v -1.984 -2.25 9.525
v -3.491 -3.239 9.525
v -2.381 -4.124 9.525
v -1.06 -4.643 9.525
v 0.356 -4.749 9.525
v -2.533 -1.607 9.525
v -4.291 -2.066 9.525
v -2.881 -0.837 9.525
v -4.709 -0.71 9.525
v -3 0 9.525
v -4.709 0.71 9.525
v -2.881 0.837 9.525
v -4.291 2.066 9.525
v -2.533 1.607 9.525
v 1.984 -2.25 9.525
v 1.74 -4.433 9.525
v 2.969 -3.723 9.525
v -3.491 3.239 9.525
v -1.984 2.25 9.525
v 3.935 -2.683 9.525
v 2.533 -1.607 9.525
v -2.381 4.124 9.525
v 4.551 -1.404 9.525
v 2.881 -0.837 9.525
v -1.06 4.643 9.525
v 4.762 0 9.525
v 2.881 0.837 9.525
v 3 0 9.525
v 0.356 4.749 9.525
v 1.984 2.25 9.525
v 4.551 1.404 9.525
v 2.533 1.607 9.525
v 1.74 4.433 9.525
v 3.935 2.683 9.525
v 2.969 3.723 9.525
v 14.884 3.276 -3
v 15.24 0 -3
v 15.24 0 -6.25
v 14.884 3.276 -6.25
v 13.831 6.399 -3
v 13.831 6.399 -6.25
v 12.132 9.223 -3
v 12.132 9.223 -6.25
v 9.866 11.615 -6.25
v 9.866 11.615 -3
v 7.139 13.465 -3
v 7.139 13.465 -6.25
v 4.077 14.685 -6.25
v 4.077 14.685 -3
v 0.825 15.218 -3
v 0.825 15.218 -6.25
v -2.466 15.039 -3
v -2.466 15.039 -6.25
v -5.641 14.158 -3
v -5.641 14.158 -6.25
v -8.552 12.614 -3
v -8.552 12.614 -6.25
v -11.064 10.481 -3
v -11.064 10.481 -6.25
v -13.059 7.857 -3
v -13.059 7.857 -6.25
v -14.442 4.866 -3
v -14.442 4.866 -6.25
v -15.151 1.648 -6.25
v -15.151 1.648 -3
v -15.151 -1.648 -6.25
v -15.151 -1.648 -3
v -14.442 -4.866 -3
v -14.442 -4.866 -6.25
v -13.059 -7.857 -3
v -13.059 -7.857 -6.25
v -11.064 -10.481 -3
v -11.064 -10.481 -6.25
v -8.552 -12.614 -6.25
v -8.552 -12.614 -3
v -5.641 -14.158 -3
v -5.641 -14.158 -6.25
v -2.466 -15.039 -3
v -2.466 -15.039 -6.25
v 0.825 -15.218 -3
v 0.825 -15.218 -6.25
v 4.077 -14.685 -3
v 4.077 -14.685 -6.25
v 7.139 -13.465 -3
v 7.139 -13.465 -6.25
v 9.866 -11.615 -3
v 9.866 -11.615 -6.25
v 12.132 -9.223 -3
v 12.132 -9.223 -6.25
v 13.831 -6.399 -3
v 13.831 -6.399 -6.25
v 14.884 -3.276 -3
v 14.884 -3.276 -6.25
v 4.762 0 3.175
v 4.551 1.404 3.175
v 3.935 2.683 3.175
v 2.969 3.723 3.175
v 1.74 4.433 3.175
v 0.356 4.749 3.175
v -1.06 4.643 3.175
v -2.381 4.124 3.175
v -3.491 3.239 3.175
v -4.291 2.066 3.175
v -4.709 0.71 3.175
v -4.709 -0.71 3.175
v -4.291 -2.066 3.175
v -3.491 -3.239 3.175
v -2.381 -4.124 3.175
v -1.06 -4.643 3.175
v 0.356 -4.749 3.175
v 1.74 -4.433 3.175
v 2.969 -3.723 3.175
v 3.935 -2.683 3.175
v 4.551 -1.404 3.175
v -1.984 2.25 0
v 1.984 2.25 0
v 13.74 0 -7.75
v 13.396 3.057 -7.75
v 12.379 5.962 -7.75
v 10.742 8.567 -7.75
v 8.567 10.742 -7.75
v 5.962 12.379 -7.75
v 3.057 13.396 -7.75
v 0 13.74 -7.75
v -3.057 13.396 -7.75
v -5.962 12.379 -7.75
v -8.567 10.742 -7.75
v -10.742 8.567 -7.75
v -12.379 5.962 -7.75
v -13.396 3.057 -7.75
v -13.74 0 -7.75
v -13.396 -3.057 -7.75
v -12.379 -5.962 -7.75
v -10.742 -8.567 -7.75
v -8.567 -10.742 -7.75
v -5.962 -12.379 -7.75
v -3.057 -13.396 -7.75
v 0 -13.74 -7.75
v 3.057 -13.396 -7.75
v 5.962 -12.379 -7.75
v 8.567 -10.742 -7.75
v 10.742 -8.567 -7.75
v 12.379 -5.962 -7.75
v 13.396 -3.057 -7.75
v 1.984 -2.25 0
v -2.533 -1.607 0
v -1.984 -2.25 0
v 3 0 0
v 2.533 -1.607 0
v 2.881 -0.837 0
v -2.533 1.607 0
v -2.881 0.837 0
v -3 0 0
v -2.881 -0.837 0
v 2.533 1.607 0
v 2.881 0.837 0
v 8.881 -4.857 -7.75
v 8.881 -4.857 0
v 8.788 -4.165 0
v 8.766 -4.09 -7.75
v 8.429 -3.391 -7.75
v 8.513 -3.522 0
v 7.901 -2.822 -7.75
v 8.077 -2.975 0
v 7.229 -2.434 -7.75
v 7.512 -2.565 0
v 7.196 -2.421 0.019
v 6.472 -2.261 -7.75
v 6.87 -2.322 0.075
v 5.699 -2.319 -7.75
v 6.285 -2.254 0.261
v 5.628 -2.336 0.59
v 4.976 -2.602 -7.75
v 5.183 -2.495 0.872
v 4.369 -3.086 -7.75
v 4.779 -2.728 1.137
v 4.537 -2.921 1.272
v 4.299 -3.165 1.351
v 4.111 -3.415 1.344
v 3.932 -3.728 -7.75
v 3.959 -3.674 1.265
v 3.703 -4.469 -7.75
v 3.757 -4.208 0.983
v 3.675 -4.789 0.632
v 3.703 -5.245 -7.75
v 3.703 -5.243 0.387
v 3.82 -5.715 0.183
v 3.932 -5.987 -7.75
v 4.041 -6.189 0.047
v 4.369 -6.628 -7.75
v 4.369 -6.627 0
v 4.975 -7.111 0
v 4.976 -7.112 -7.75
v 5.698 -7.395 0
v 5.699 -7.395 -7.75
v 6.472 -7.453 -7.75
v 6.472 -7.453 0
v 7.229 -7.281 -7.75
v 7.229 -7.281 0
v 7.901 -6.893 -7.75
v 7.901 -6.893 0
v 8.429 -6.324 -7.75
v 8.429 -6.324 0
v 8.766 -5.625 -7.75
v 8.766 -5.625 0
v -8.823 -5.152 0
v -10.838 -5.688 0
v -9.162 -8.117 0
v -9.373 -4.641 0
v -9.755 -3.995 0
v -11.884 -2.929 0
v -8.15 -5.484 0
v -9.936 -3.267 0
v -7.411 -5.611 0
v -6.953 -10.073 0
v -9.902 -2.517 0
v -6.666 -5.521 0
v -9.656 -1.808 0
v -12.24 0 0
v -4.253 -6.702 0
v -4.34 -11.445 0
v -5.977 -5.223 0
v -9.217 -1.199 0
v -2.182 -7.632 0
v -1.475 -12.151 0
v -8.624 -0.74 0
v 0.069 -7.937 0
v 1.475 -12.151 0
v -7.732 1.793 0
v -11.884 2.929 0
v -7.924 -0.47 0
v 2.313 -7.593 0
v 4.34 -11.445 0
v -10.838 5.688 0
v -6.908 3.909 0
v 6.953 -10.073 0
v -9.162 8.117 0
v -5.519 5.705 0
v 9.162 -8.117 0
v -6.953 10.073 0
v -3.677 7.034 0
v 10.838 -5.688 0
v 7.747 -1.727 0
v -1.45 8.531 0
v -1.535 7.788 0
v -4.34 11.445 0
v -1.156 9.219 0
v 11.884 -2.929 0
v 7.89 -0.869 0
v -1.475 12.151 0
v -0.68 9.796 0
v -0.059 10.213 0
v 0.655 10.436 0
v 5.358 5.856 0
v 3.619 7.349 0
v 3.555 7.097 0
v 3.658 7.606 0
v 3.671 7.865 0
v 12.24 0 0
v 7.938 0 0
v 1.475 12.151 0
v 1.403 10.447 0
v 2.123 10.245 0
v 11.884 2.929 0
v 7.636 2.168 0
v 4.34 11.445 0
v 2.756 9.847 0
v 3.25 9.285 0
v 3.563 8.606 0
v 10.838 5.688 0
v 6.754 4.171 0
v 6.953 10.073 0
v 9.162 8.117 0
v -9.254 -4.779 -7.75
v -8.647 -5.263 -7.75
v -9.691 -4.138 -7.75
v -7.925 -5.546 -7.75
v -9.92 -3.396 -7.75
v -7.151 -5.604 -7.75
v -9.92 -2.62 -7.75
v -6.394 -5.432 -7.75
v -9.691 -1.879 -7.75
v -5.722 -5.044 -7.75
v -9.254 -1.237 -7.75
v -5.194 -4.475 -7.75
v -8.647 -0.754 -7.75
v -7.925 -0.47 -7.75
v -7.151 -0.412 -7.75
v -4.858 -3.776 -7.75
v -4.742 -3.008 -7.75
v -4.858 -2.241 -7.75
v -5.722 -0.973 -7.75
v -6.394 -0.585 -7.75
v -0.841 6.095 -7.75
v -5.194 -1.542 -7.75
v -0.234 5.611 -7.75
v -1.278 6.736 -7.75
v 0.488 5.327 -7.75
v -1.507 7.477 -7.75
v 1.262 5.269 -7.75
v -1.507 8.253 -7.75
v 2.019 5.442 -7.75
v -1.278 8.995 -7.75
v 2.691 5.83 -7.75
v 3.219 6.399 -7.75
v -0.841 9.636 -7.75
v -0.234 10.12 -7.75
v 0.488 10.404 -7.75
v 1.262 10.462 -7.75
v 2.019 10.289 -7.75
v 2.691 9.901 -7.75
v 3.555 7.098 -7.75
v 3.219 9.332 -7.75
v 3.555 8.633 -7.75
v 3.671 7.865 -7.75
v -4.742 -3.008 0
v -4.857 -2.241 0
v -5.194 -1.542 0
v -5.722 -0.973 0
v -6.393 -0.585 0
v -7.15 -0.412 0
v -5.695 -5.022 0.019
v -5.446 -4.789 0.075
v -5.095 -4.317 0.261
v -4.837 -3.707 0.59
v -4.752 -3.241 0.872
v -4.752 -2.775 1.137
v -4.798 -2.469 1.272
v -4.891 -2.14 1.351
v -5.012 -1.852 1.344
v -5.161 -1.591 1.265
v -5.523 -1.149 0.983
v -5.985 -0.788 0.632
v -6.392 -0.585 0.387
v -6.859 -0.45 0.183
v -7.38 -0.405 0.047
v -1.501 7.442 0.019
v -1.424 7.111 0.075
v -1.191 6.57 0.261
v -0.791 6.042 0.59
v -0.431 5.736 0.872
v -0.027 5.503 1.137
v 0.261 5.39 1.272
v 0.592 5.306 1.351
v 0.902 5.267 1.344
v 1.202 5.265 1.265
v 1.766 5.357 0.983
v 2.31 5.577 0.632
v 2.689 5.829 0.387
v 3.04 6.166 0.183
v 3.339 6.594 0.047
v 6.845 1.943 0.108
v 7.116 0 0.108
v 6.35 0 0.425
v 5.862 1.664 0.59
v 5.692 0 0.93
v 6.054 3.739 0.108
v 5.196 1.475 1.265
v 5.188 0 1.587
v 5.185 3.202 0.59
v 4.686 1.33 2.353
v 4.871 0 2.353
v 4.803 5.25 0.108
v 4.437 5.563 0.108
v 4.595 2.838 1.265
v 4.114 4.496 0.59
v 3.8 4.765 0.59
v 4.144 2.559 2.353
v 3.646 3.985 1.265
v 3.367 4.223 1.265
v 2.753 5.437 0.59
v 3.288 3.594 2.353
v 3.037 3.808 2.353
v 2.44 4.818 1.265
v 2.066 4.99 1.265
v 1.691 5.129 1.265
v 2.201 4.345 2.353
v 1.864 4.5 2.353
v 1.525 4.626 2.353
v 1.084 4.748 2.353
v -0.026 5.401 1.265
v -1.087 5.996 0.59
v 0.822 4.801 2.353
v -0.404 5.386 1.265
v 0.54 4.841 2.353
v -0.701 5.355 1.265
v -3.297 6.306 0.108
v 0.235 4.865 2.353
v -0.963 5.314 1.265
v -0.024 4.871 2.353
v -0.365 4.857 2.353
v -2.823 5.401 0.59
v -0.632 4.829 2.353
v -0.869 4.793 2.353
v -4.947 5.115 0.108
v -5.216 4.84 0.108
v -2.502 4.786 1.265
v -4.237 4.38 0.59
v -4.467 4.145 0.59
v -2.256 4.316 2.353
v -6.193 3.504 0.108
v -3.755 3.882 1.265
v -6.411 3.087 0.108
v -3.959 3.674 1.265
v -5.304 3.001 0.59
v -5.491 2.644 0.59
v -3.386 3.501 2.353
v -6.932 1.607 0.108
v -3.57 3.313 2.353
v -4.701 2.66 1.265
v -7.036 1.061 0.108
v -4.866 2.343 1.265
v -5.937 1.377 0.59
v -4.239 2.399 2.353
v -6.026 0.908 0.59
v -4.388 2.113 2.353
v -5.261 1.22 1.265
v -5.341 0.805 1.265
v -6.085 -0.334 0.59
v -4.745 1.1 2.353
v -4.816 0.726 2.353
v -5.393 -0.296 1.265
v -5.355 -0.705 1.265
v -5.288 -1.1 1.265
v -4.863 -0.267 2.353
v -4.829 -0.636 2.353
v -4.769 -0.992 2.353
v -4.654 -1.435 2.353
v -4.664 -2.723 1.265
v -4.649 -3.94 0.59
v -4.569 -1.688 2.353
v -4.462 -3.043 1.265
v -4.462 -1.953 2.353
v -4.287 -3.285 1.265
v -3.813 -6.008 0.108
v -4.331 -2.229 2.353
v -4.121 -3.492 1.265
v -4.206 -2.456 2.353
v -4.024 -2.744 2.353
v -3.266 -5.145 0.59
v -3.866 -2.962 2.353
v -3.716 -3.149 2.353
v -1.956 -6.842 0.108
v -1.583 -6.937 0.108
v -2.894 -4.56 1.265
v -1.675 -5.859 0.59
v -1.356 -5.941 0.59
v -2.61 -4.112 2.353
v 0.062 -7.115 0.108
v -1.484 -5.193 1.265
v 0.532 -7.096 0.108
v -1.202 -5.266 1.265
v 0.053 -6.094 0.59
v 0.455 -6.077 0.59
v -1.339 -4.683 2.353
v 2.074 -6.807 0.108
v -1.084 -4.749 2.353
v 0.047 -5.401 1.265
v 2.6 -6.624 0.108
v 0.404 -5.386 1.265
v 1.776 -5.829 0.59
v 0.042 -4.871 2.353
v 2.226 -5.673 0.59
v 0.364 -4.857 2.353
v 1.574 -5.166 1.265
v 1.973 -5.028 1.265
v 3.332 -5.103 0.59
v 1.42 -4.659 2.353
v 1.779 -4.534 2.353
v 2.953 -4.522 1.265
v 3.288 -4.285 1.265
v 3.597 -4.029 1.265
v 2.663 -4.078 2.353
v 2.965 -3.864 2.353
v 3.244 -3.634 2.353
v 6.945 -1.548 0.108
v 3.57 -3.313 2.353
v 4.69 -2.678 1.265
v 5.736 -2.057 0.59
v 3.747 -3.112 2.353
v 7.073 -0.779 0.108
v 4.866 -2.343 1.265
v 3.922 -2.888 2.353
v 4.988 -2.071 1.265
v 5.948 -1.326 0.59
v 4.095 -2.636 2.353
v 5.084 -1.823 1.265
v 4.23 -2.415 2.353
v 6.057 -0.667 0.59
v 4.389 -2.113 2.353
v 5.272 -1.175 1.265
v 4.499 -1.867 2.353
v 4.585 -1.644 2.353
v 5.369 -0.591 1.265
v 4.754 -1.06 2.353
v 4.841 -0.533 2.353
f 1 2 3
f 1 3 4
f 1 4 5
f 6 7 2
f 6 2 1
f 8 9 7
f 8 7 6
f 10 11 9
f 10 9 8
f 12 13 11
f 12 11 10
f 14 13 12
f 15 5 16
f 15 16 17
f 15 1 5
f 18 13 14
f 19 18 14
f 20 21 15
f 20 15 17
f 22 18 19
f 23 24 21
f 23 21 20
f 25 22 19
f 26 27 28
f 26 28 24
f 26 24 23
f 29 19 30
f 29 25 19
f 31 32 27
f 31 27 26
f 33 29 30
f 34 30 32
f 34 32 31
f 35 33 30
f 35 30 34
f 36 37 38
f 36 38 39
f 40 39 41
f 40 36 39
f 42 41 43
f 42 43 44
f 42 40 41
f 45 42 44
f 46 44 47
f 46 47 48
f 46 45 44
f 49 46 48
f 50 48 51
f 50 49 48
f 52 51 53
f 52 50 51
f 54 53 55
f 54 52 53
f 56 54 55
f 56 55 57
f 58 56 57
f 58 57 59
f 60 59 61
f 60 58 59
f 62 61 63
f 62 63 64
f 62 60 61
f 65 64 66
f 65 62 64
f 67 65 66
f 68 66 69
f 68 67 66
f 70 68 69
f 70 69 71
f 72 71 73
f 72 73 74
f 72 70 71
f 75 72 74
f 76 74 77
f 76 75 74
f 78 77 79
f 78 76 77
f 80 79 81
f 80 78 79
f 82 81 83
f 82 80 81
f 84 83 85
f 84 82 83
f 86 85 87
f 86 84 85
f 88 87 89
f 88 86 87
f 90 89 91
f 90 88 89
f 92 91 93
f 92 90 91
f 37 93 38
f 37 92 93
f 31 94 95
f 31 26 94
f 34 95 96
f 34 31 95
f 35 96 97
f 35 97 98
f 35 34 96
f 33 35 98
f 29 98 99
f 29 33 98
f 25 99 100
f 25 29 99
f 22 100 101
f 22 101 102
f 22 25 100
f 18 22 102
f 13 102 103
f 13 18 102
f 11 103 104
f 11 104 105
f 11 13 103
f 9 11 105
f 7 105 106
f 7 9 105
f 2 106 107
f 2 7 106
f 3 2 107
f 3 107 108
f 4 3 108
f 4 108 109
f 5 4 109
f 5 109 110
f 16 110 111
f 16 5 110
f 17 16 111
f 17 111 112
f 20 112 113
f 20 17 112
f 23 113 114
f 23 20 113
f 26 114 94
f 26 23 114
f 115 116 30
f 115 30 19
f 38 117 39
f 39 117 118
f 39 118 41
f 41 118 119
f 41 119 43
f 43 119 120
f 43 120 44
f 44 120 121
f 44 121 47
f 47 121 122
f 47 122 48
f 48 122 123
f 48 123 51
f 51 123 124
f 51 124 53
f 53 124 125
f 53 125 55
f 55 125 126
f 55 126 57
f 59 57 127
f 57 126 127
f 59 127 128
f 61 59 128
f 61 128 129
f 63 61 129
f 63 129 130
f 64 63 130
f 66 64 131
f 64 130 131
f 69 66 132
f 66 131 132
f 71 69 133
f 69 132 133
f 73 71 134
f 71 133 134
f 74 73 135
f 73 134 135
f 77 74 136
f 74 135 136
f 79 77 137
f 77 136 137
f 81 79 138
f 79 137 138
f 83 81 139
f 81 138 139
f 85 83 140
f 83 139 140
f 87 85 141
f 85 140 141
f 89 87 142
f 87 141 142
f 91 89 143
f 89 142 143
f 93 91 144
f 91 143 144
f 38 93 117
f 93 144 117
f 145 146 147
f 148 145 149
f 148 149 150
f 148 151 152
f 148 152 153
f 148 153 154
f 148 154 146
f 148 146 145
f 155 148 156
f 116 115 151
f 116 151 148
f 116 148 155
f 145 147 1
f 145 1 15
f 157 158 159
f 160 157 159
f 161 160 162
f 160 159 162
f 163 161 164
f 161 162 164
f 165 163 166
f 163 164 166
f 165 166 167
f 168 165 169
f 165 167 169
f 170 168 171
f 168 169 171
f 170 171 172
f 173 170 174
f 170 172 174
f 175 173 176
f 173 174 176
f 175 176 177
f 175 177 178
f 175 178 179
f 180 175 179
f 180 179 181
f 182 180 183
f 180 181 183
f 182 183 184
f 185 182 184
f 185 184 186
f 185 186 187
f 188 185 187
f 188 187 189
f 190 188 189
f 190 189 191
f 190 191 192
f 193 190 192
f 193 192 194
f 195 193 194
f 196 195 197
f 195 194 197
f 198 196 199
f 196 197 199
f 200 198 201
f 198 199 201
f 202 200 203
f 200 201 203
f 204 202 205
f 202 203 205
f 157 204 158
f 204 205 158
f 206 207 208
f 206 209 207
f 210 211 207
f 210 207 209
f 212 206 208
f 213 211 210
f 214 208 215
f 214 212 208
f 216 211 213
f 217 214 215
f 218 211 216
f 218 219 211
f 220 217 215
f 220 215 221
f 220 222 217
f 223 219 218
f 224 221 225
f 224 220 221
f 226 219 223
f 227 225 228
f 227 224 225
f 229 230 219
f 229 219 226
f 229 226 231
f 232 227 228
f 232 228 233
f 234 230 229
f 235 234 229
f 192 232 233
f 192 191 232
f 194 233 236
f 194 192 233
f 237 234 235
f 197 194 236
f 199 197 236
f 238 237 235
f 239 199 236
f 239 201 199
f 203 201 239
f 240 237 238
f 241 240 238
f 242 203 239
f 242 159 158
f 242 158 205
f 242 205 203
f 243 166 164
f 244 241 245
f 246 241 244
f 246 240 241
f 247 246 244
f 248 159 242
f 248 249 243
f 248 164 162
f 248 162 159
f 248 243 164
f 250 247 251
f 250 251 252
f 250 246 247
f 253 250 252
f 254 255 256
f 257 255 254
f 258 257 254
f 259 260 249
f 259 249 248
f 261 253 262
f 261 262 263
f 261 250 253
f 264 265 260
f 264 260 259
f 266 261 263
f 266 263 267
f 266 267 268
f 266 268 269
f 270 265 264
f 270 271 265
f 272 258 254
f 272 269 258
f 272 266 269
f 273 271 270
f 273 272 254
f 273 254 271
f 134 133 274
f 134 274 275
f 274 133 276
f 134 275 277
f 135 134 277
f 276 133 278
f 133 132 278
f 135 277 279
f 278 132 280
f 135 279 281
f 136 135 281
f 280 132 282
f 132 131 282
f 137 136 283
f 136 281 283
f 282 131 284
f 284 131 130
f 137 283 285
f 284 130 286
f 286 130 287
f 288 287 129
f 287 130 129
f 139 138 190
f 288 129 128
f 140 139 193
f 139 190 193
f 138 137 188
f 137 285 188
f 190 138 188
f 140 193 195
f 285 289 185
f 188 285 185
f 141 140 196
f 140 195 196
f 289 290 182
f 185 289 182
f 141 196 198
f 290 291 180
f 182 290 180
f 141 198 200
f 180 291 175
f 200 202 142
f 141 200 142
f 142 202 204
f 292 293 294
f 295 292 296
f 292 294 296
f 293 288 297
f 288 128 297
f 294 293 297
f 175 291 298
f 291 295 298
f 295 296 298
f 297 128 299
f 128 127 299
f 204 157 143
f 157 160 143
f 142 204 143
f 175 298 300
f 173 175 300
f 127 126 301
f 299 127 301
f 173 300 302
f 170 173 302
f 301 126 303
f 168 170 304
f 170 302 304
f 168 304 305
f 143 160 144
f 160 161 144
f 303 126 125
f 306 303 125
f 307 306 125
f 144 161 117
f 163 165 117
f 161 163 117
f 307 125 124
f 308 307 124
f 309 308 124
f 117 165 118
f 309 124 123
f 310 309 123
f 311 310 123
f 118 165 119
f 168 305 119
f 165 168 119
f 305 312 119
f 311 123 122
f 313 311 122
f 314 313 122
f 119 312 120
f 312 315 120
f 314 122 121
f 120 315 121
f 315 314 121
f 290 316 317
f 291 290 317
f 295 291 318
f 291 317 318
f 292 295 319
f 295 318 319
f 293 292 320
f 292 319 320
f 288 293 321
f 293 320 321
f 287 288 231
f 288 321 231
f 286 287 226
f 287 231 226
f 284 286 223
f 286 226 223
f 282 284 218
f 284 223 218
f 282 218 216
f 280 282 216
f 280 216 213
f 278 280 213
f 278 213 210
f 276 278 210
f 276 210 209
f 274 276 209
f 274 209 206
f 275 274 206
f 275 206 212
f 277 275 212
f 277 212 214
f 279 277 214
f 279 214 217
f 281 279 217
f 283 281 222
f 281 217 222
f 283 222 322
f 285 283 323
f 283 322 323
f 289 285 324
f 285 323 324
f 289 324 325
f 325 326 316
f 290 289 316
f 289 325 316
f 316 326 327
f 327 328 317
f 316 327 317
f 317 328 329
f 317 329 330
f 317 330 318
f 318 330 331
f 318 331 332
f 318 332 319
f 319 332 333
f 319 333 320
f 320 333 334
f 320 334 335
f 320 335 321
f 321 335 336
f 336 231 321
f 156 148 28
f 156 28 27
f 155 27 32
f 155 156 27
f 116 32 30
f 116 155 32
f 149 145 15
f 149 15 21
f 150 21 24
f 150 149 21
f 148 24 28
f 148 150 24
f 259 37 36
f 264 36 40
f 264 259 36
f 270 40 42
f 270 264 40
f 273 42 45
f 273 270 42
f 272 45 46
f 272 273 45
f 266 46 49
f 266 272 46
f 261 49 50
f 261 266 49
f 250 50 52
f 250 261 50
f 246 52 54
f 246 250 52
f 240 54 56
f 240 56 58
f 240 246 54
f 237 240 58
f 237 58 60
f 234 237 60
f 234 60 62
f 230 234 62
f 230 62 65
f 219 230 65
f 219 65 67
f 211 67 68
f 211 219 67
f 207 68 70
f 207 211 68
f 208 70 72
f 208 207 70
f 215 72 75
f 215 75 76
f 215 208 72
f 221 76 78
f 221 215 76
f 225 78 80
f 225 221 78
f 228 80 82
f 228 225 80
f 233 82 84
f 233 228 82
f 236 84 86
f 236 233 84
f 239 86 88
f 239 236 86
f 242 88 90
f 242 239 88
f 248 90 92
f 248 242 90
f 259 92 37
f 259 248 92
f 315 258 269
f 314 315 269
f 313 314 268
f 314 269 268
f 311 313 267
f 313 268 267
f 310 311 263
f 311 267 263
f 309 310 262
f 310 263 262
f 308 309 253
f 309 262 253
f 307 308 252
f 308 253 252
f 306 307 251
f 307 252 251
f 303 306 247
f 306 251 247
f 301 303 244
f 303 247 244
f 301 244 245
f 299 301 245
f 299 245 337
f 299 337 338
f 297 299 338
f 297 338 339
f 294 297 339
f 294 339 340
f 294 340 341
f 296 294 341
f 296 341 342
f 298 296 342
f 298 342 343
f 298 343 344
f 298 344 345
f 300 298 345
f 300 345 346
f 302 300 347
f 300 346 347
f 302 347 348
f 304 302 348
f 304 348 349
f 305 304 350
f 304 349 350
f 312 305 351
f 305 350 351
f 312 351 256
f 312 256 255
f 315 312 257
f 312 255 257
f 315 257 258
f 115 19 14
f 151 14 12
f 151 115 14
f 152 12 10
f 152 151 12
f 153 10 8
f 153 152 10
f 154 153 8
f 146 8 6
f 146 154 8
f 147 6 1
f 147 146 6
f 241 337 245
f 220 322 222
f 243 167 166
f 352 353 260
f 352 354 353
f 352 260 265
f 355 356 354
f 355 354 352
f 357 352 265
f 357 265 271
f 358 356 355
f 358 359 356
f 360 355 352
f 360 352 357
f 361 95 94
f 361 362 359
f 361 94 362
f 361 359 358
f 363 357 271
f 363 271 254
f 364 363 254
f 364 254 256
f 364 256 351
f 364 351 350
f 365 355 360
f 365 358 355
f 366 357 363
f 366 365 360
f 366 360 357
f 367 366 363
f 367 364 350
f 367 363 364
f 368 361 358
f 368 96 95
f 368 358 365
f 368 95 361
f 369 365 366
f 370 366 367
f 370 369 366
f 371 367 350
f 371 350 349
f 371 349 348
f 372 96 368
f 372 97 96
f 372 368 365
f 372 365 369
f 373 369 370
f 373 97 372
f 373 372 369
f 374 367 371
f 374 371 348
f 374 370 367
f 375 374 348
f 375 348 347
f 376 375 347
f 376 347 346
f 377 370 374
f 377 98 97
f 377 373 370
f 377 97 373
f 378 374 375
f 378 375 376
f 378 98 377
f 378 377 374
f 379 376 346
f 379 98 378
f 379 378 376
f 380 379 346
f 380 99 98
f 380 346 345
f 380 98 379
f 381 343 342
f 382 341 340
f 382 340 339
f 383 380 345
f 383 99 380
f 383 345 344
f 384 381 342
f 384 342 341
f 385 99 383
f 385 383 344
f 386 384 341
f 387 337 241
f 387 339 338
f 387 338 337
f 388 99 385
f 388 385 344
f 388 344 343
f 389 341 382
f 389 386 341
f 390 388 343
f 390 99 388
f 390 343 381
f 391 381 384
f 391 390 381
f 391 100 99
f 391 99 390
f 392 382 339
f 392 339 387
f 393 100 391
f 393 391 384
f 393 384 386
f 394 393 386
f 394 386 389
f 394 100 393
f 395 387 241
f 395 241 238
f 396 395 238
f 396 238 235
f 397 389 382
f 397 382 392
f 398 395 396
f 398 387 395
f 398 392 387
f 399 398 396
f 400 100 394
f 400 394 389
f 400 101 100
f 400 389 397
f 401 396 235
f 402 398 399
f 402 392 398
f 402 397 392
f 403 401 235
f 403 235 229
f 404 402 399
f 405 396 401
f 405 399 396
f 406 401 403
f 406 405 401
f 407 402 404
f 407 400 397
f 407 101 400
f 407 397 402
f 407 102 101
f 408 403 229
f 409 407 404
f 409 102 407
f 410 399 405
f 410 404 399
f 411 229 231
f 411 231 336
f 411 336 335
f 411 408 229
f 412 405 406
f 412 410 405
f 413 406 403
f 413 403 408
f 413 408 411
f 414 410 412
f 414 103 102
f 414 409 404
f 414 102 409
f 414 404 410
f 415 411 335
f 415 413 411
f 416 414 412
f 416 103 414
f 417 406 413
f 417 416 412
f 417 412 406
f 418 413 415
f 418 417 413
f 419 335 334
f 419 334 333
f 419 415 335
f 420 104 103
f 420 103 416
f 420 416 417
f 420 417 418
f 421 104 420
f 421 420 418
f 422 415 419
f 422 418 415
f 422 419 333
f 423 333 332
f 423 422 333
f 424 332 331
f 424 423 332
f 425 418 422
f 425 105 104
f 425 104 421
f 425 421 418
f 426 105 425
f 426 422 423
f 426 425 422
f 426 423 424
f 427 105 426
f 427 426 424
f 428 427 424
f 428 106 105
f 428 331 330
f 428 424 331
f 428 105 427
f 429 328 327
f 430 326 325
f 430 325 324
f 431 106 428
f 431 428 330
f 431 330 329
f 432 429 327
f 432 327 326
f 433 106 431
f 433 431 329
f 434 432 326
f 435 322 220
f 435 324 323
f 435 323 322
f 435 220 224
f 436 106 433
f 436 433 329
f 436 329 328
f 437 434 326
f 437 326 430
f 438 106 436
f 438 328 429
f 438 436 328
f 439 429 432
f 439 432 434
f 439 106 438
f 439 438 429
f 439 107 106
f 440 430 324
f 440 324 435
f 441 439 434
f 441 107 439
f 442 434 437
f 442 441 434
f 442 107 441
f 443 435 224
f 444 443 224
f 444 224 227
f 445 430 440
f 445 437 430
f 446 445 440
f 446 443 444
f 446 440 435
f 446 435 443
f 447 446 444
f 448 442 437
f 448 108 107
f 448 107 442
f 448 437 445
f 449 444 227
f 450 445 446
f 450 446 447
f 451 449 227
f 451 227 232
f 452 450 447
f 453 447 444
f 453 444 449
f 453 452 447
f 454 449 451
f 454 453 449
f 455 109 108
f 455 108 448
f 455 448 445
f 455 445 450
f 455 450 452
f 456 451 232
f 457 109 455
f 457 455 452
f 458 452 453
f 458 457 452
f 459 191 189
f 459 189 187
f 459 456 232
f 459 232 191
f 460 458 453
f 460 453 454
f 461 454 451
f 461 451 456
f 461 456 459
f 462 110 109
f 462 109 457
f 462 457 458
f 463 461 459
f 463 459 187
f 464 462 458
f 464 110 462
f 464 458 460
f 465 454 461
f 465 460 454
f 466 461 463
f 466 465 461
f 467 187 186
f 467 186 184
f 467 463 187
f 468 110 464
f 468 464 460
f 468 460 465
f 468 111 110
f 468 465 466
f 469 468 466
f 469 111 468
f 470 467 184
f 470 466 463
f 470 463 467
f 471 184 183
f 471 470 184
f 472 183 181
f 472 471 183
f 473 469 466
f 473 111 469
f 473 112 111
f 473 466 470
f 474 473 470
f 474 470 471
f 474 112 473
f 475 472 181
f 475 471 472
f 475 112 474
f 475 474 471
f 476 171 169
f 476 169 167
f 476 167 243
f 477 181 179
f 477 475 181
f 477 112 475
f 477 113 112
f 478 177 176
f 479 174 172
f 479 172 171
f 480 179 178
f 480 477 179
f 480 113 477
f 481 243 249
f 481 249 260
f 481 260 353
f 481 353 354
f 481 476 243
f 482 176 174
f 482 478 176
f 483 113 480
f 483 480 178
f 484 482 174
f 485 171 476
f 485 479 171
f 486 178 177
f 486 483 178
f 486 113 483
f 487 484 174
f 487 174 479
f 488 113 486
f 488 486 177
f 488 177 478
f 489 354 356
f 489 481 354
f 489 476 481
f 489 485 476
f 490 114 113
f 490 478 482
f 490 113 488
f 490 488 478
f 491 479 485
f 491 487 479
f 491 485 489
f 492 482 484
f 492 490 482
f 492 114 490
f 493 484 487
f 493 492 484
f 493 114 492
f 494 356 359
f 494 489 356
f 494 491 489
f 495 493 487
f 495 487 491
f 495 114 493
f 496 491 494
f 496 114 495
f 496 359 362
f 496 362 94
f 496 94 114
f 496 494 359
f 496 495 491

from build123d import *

# Parameters (mm, degrees)
F0_R          = 4.7625
F1_DEPTH      = 9.525
F1_DEPTH_BACK = 6.35
F3_DEPTH      = 9.526
F4_R          = 15.24
F5_DEPTH      = 7.75
F6_R          = 2.6035
F7_DEPTH      = 13.97
F8_SIZE       = 1.5
F9_SIZE       = 3
F10_S5_R      = 2.6035
F10_T6_DEPTH  = 14
F10_S7_R      = 2.6035
F10_T8_DEPTH  = 14
F10_S9_R      = 2.6035
F10_T10_DEPTH = 14


# Not quite as in the source:
# - a fillet or chamfer that OpenCascade refuses, or shapes differently, is made with other operations: its cross-section is extruded or revolved along the edge and cut away or added


with BuildPart() as f1:
    # F0 (on Top) → F1 (new body, two sides)
    with BuildSketch(Plane.XY) as f1_sk:
        Circle(F0_R)
    extrude(amount=F1_DEPTH)
    extrude(f1_sk.sketch, amount=-F1_DEPTH_BACK)

    # F2 (on Top) → F3 (cut, through all)
    with BuildSketch(Plane.XY):
        with BuildLine():
            ThreePointArc((1.9843134833, -2.25), (2.7343134833, -1.2343134833), (3, 0))
            ThreePointArc((3, 0), (2.7343134833, 1.2343134833), (1.9843134833, 2.25))
            Line((1.9843134833, 2.25), (-1.9843134833, 2.25))
            ThreePointArc((-1.9843134833, 2.25), (-3, 0), (-1.9843134833, -2.25))
            Line((-1.9843134833, -2.25), (1.9843134833, -2.25))
        make_face()
    extrude(amount=F3_DEPTH, mode=Mode.SUBTRACT)

    # F4 (on Top) → F5 (join)
    with BuildSketch(Plane.XY):
        Circle(F4_R)
    extrude(amount=-F5_DEPTH)

    # F6 (on face) → F7 (cut)
    with BuildSketch(Plane(origin=(0, 0, -7.75), x_dir=(1, 0, 0), z_dir=(0, 0, -1))):
        with Locations((1.0674559099, -7.8653953575)):
            Circle(F6_R)
        with Locations((6.2779042355, 4.8571416142)):
            Circle(F6_R)
        with Locations((-7.3453601454, 3.0082537434)):
            Circle(F6_R)
    extrude(amount=-F7_DEPTH, mode=Mode.SUBTRACT)

    # F8
    f8_edges = [f1.edges().sort_by_distance(p)[0] for p in [
        (-15.24, 0, -7.75),
    ]]
    chamfer(f8_edges, length=F8_SIZE)

    # F9
    f9_edges = [f1.edges().sort_by_distance(p)[0] for p in [
        (-15.24, 0, 0),
    ]]
    chamfer(f9_edges, length=F9_SIZE)

    # F10: fillet of radius 3.175 on 1 edges, made by hand


with BuildPart() as f10_tool2:
    # F10_s3 → F10_t4 (revolve)
    with BuildSketch(Plane.XZ):
        with BuildLine():
            ThreePointArc((7.9375, 0), (5.6924359697, 0.9299359697), (4.7625, 3.175))
            Line((4.7625, 3.175), (4.7625, 0))
            Line((4.7625, 0), (7.9375, 0))
        make_face()
    revolve(axis=Axis((0, 0, 0), (0, 0, 1)))

    # F10_s5 → F10_t6 (cut, symmetric)
    with BuildSketch(Plane.XY.offset(2.7)):
        with Locations((-7.3453601454, -3.0082537434)):
            Circle(F10_S5_R)
    extrude(amount=F10_T6_DEPTH, both=True, mode=Mode.SUBTRACT)

    # F10_s7 → F10_t8 (cut, symmetric)
    with BuildSketch(Plane.XY.offset(2.7)):
        with Locations((6.2779042355, -4.8571416142)):
            Circle(F10_S7_R)
    extrude(amount=F10_T8_DEPTH, both=True, mode=Mode.SUBTRACT)

    # F10_s9 → F10_t10 (cut, symmetric)
    with BuildSketch(Plane.XY.offset(2.7)):
        with Locations((1.0674559099, 7.8653953575)):
            Circle(F10_S9_R)
    extrude(amount=F10_T10_DEPTH, both=True, mode=Mode.SUBTRACT)


with BuildPart() as f1_1:
    add(f1.part)

    # F10_t1: union F10_tool2
    add(f10_tool2.part)


solid = f1_1.part
